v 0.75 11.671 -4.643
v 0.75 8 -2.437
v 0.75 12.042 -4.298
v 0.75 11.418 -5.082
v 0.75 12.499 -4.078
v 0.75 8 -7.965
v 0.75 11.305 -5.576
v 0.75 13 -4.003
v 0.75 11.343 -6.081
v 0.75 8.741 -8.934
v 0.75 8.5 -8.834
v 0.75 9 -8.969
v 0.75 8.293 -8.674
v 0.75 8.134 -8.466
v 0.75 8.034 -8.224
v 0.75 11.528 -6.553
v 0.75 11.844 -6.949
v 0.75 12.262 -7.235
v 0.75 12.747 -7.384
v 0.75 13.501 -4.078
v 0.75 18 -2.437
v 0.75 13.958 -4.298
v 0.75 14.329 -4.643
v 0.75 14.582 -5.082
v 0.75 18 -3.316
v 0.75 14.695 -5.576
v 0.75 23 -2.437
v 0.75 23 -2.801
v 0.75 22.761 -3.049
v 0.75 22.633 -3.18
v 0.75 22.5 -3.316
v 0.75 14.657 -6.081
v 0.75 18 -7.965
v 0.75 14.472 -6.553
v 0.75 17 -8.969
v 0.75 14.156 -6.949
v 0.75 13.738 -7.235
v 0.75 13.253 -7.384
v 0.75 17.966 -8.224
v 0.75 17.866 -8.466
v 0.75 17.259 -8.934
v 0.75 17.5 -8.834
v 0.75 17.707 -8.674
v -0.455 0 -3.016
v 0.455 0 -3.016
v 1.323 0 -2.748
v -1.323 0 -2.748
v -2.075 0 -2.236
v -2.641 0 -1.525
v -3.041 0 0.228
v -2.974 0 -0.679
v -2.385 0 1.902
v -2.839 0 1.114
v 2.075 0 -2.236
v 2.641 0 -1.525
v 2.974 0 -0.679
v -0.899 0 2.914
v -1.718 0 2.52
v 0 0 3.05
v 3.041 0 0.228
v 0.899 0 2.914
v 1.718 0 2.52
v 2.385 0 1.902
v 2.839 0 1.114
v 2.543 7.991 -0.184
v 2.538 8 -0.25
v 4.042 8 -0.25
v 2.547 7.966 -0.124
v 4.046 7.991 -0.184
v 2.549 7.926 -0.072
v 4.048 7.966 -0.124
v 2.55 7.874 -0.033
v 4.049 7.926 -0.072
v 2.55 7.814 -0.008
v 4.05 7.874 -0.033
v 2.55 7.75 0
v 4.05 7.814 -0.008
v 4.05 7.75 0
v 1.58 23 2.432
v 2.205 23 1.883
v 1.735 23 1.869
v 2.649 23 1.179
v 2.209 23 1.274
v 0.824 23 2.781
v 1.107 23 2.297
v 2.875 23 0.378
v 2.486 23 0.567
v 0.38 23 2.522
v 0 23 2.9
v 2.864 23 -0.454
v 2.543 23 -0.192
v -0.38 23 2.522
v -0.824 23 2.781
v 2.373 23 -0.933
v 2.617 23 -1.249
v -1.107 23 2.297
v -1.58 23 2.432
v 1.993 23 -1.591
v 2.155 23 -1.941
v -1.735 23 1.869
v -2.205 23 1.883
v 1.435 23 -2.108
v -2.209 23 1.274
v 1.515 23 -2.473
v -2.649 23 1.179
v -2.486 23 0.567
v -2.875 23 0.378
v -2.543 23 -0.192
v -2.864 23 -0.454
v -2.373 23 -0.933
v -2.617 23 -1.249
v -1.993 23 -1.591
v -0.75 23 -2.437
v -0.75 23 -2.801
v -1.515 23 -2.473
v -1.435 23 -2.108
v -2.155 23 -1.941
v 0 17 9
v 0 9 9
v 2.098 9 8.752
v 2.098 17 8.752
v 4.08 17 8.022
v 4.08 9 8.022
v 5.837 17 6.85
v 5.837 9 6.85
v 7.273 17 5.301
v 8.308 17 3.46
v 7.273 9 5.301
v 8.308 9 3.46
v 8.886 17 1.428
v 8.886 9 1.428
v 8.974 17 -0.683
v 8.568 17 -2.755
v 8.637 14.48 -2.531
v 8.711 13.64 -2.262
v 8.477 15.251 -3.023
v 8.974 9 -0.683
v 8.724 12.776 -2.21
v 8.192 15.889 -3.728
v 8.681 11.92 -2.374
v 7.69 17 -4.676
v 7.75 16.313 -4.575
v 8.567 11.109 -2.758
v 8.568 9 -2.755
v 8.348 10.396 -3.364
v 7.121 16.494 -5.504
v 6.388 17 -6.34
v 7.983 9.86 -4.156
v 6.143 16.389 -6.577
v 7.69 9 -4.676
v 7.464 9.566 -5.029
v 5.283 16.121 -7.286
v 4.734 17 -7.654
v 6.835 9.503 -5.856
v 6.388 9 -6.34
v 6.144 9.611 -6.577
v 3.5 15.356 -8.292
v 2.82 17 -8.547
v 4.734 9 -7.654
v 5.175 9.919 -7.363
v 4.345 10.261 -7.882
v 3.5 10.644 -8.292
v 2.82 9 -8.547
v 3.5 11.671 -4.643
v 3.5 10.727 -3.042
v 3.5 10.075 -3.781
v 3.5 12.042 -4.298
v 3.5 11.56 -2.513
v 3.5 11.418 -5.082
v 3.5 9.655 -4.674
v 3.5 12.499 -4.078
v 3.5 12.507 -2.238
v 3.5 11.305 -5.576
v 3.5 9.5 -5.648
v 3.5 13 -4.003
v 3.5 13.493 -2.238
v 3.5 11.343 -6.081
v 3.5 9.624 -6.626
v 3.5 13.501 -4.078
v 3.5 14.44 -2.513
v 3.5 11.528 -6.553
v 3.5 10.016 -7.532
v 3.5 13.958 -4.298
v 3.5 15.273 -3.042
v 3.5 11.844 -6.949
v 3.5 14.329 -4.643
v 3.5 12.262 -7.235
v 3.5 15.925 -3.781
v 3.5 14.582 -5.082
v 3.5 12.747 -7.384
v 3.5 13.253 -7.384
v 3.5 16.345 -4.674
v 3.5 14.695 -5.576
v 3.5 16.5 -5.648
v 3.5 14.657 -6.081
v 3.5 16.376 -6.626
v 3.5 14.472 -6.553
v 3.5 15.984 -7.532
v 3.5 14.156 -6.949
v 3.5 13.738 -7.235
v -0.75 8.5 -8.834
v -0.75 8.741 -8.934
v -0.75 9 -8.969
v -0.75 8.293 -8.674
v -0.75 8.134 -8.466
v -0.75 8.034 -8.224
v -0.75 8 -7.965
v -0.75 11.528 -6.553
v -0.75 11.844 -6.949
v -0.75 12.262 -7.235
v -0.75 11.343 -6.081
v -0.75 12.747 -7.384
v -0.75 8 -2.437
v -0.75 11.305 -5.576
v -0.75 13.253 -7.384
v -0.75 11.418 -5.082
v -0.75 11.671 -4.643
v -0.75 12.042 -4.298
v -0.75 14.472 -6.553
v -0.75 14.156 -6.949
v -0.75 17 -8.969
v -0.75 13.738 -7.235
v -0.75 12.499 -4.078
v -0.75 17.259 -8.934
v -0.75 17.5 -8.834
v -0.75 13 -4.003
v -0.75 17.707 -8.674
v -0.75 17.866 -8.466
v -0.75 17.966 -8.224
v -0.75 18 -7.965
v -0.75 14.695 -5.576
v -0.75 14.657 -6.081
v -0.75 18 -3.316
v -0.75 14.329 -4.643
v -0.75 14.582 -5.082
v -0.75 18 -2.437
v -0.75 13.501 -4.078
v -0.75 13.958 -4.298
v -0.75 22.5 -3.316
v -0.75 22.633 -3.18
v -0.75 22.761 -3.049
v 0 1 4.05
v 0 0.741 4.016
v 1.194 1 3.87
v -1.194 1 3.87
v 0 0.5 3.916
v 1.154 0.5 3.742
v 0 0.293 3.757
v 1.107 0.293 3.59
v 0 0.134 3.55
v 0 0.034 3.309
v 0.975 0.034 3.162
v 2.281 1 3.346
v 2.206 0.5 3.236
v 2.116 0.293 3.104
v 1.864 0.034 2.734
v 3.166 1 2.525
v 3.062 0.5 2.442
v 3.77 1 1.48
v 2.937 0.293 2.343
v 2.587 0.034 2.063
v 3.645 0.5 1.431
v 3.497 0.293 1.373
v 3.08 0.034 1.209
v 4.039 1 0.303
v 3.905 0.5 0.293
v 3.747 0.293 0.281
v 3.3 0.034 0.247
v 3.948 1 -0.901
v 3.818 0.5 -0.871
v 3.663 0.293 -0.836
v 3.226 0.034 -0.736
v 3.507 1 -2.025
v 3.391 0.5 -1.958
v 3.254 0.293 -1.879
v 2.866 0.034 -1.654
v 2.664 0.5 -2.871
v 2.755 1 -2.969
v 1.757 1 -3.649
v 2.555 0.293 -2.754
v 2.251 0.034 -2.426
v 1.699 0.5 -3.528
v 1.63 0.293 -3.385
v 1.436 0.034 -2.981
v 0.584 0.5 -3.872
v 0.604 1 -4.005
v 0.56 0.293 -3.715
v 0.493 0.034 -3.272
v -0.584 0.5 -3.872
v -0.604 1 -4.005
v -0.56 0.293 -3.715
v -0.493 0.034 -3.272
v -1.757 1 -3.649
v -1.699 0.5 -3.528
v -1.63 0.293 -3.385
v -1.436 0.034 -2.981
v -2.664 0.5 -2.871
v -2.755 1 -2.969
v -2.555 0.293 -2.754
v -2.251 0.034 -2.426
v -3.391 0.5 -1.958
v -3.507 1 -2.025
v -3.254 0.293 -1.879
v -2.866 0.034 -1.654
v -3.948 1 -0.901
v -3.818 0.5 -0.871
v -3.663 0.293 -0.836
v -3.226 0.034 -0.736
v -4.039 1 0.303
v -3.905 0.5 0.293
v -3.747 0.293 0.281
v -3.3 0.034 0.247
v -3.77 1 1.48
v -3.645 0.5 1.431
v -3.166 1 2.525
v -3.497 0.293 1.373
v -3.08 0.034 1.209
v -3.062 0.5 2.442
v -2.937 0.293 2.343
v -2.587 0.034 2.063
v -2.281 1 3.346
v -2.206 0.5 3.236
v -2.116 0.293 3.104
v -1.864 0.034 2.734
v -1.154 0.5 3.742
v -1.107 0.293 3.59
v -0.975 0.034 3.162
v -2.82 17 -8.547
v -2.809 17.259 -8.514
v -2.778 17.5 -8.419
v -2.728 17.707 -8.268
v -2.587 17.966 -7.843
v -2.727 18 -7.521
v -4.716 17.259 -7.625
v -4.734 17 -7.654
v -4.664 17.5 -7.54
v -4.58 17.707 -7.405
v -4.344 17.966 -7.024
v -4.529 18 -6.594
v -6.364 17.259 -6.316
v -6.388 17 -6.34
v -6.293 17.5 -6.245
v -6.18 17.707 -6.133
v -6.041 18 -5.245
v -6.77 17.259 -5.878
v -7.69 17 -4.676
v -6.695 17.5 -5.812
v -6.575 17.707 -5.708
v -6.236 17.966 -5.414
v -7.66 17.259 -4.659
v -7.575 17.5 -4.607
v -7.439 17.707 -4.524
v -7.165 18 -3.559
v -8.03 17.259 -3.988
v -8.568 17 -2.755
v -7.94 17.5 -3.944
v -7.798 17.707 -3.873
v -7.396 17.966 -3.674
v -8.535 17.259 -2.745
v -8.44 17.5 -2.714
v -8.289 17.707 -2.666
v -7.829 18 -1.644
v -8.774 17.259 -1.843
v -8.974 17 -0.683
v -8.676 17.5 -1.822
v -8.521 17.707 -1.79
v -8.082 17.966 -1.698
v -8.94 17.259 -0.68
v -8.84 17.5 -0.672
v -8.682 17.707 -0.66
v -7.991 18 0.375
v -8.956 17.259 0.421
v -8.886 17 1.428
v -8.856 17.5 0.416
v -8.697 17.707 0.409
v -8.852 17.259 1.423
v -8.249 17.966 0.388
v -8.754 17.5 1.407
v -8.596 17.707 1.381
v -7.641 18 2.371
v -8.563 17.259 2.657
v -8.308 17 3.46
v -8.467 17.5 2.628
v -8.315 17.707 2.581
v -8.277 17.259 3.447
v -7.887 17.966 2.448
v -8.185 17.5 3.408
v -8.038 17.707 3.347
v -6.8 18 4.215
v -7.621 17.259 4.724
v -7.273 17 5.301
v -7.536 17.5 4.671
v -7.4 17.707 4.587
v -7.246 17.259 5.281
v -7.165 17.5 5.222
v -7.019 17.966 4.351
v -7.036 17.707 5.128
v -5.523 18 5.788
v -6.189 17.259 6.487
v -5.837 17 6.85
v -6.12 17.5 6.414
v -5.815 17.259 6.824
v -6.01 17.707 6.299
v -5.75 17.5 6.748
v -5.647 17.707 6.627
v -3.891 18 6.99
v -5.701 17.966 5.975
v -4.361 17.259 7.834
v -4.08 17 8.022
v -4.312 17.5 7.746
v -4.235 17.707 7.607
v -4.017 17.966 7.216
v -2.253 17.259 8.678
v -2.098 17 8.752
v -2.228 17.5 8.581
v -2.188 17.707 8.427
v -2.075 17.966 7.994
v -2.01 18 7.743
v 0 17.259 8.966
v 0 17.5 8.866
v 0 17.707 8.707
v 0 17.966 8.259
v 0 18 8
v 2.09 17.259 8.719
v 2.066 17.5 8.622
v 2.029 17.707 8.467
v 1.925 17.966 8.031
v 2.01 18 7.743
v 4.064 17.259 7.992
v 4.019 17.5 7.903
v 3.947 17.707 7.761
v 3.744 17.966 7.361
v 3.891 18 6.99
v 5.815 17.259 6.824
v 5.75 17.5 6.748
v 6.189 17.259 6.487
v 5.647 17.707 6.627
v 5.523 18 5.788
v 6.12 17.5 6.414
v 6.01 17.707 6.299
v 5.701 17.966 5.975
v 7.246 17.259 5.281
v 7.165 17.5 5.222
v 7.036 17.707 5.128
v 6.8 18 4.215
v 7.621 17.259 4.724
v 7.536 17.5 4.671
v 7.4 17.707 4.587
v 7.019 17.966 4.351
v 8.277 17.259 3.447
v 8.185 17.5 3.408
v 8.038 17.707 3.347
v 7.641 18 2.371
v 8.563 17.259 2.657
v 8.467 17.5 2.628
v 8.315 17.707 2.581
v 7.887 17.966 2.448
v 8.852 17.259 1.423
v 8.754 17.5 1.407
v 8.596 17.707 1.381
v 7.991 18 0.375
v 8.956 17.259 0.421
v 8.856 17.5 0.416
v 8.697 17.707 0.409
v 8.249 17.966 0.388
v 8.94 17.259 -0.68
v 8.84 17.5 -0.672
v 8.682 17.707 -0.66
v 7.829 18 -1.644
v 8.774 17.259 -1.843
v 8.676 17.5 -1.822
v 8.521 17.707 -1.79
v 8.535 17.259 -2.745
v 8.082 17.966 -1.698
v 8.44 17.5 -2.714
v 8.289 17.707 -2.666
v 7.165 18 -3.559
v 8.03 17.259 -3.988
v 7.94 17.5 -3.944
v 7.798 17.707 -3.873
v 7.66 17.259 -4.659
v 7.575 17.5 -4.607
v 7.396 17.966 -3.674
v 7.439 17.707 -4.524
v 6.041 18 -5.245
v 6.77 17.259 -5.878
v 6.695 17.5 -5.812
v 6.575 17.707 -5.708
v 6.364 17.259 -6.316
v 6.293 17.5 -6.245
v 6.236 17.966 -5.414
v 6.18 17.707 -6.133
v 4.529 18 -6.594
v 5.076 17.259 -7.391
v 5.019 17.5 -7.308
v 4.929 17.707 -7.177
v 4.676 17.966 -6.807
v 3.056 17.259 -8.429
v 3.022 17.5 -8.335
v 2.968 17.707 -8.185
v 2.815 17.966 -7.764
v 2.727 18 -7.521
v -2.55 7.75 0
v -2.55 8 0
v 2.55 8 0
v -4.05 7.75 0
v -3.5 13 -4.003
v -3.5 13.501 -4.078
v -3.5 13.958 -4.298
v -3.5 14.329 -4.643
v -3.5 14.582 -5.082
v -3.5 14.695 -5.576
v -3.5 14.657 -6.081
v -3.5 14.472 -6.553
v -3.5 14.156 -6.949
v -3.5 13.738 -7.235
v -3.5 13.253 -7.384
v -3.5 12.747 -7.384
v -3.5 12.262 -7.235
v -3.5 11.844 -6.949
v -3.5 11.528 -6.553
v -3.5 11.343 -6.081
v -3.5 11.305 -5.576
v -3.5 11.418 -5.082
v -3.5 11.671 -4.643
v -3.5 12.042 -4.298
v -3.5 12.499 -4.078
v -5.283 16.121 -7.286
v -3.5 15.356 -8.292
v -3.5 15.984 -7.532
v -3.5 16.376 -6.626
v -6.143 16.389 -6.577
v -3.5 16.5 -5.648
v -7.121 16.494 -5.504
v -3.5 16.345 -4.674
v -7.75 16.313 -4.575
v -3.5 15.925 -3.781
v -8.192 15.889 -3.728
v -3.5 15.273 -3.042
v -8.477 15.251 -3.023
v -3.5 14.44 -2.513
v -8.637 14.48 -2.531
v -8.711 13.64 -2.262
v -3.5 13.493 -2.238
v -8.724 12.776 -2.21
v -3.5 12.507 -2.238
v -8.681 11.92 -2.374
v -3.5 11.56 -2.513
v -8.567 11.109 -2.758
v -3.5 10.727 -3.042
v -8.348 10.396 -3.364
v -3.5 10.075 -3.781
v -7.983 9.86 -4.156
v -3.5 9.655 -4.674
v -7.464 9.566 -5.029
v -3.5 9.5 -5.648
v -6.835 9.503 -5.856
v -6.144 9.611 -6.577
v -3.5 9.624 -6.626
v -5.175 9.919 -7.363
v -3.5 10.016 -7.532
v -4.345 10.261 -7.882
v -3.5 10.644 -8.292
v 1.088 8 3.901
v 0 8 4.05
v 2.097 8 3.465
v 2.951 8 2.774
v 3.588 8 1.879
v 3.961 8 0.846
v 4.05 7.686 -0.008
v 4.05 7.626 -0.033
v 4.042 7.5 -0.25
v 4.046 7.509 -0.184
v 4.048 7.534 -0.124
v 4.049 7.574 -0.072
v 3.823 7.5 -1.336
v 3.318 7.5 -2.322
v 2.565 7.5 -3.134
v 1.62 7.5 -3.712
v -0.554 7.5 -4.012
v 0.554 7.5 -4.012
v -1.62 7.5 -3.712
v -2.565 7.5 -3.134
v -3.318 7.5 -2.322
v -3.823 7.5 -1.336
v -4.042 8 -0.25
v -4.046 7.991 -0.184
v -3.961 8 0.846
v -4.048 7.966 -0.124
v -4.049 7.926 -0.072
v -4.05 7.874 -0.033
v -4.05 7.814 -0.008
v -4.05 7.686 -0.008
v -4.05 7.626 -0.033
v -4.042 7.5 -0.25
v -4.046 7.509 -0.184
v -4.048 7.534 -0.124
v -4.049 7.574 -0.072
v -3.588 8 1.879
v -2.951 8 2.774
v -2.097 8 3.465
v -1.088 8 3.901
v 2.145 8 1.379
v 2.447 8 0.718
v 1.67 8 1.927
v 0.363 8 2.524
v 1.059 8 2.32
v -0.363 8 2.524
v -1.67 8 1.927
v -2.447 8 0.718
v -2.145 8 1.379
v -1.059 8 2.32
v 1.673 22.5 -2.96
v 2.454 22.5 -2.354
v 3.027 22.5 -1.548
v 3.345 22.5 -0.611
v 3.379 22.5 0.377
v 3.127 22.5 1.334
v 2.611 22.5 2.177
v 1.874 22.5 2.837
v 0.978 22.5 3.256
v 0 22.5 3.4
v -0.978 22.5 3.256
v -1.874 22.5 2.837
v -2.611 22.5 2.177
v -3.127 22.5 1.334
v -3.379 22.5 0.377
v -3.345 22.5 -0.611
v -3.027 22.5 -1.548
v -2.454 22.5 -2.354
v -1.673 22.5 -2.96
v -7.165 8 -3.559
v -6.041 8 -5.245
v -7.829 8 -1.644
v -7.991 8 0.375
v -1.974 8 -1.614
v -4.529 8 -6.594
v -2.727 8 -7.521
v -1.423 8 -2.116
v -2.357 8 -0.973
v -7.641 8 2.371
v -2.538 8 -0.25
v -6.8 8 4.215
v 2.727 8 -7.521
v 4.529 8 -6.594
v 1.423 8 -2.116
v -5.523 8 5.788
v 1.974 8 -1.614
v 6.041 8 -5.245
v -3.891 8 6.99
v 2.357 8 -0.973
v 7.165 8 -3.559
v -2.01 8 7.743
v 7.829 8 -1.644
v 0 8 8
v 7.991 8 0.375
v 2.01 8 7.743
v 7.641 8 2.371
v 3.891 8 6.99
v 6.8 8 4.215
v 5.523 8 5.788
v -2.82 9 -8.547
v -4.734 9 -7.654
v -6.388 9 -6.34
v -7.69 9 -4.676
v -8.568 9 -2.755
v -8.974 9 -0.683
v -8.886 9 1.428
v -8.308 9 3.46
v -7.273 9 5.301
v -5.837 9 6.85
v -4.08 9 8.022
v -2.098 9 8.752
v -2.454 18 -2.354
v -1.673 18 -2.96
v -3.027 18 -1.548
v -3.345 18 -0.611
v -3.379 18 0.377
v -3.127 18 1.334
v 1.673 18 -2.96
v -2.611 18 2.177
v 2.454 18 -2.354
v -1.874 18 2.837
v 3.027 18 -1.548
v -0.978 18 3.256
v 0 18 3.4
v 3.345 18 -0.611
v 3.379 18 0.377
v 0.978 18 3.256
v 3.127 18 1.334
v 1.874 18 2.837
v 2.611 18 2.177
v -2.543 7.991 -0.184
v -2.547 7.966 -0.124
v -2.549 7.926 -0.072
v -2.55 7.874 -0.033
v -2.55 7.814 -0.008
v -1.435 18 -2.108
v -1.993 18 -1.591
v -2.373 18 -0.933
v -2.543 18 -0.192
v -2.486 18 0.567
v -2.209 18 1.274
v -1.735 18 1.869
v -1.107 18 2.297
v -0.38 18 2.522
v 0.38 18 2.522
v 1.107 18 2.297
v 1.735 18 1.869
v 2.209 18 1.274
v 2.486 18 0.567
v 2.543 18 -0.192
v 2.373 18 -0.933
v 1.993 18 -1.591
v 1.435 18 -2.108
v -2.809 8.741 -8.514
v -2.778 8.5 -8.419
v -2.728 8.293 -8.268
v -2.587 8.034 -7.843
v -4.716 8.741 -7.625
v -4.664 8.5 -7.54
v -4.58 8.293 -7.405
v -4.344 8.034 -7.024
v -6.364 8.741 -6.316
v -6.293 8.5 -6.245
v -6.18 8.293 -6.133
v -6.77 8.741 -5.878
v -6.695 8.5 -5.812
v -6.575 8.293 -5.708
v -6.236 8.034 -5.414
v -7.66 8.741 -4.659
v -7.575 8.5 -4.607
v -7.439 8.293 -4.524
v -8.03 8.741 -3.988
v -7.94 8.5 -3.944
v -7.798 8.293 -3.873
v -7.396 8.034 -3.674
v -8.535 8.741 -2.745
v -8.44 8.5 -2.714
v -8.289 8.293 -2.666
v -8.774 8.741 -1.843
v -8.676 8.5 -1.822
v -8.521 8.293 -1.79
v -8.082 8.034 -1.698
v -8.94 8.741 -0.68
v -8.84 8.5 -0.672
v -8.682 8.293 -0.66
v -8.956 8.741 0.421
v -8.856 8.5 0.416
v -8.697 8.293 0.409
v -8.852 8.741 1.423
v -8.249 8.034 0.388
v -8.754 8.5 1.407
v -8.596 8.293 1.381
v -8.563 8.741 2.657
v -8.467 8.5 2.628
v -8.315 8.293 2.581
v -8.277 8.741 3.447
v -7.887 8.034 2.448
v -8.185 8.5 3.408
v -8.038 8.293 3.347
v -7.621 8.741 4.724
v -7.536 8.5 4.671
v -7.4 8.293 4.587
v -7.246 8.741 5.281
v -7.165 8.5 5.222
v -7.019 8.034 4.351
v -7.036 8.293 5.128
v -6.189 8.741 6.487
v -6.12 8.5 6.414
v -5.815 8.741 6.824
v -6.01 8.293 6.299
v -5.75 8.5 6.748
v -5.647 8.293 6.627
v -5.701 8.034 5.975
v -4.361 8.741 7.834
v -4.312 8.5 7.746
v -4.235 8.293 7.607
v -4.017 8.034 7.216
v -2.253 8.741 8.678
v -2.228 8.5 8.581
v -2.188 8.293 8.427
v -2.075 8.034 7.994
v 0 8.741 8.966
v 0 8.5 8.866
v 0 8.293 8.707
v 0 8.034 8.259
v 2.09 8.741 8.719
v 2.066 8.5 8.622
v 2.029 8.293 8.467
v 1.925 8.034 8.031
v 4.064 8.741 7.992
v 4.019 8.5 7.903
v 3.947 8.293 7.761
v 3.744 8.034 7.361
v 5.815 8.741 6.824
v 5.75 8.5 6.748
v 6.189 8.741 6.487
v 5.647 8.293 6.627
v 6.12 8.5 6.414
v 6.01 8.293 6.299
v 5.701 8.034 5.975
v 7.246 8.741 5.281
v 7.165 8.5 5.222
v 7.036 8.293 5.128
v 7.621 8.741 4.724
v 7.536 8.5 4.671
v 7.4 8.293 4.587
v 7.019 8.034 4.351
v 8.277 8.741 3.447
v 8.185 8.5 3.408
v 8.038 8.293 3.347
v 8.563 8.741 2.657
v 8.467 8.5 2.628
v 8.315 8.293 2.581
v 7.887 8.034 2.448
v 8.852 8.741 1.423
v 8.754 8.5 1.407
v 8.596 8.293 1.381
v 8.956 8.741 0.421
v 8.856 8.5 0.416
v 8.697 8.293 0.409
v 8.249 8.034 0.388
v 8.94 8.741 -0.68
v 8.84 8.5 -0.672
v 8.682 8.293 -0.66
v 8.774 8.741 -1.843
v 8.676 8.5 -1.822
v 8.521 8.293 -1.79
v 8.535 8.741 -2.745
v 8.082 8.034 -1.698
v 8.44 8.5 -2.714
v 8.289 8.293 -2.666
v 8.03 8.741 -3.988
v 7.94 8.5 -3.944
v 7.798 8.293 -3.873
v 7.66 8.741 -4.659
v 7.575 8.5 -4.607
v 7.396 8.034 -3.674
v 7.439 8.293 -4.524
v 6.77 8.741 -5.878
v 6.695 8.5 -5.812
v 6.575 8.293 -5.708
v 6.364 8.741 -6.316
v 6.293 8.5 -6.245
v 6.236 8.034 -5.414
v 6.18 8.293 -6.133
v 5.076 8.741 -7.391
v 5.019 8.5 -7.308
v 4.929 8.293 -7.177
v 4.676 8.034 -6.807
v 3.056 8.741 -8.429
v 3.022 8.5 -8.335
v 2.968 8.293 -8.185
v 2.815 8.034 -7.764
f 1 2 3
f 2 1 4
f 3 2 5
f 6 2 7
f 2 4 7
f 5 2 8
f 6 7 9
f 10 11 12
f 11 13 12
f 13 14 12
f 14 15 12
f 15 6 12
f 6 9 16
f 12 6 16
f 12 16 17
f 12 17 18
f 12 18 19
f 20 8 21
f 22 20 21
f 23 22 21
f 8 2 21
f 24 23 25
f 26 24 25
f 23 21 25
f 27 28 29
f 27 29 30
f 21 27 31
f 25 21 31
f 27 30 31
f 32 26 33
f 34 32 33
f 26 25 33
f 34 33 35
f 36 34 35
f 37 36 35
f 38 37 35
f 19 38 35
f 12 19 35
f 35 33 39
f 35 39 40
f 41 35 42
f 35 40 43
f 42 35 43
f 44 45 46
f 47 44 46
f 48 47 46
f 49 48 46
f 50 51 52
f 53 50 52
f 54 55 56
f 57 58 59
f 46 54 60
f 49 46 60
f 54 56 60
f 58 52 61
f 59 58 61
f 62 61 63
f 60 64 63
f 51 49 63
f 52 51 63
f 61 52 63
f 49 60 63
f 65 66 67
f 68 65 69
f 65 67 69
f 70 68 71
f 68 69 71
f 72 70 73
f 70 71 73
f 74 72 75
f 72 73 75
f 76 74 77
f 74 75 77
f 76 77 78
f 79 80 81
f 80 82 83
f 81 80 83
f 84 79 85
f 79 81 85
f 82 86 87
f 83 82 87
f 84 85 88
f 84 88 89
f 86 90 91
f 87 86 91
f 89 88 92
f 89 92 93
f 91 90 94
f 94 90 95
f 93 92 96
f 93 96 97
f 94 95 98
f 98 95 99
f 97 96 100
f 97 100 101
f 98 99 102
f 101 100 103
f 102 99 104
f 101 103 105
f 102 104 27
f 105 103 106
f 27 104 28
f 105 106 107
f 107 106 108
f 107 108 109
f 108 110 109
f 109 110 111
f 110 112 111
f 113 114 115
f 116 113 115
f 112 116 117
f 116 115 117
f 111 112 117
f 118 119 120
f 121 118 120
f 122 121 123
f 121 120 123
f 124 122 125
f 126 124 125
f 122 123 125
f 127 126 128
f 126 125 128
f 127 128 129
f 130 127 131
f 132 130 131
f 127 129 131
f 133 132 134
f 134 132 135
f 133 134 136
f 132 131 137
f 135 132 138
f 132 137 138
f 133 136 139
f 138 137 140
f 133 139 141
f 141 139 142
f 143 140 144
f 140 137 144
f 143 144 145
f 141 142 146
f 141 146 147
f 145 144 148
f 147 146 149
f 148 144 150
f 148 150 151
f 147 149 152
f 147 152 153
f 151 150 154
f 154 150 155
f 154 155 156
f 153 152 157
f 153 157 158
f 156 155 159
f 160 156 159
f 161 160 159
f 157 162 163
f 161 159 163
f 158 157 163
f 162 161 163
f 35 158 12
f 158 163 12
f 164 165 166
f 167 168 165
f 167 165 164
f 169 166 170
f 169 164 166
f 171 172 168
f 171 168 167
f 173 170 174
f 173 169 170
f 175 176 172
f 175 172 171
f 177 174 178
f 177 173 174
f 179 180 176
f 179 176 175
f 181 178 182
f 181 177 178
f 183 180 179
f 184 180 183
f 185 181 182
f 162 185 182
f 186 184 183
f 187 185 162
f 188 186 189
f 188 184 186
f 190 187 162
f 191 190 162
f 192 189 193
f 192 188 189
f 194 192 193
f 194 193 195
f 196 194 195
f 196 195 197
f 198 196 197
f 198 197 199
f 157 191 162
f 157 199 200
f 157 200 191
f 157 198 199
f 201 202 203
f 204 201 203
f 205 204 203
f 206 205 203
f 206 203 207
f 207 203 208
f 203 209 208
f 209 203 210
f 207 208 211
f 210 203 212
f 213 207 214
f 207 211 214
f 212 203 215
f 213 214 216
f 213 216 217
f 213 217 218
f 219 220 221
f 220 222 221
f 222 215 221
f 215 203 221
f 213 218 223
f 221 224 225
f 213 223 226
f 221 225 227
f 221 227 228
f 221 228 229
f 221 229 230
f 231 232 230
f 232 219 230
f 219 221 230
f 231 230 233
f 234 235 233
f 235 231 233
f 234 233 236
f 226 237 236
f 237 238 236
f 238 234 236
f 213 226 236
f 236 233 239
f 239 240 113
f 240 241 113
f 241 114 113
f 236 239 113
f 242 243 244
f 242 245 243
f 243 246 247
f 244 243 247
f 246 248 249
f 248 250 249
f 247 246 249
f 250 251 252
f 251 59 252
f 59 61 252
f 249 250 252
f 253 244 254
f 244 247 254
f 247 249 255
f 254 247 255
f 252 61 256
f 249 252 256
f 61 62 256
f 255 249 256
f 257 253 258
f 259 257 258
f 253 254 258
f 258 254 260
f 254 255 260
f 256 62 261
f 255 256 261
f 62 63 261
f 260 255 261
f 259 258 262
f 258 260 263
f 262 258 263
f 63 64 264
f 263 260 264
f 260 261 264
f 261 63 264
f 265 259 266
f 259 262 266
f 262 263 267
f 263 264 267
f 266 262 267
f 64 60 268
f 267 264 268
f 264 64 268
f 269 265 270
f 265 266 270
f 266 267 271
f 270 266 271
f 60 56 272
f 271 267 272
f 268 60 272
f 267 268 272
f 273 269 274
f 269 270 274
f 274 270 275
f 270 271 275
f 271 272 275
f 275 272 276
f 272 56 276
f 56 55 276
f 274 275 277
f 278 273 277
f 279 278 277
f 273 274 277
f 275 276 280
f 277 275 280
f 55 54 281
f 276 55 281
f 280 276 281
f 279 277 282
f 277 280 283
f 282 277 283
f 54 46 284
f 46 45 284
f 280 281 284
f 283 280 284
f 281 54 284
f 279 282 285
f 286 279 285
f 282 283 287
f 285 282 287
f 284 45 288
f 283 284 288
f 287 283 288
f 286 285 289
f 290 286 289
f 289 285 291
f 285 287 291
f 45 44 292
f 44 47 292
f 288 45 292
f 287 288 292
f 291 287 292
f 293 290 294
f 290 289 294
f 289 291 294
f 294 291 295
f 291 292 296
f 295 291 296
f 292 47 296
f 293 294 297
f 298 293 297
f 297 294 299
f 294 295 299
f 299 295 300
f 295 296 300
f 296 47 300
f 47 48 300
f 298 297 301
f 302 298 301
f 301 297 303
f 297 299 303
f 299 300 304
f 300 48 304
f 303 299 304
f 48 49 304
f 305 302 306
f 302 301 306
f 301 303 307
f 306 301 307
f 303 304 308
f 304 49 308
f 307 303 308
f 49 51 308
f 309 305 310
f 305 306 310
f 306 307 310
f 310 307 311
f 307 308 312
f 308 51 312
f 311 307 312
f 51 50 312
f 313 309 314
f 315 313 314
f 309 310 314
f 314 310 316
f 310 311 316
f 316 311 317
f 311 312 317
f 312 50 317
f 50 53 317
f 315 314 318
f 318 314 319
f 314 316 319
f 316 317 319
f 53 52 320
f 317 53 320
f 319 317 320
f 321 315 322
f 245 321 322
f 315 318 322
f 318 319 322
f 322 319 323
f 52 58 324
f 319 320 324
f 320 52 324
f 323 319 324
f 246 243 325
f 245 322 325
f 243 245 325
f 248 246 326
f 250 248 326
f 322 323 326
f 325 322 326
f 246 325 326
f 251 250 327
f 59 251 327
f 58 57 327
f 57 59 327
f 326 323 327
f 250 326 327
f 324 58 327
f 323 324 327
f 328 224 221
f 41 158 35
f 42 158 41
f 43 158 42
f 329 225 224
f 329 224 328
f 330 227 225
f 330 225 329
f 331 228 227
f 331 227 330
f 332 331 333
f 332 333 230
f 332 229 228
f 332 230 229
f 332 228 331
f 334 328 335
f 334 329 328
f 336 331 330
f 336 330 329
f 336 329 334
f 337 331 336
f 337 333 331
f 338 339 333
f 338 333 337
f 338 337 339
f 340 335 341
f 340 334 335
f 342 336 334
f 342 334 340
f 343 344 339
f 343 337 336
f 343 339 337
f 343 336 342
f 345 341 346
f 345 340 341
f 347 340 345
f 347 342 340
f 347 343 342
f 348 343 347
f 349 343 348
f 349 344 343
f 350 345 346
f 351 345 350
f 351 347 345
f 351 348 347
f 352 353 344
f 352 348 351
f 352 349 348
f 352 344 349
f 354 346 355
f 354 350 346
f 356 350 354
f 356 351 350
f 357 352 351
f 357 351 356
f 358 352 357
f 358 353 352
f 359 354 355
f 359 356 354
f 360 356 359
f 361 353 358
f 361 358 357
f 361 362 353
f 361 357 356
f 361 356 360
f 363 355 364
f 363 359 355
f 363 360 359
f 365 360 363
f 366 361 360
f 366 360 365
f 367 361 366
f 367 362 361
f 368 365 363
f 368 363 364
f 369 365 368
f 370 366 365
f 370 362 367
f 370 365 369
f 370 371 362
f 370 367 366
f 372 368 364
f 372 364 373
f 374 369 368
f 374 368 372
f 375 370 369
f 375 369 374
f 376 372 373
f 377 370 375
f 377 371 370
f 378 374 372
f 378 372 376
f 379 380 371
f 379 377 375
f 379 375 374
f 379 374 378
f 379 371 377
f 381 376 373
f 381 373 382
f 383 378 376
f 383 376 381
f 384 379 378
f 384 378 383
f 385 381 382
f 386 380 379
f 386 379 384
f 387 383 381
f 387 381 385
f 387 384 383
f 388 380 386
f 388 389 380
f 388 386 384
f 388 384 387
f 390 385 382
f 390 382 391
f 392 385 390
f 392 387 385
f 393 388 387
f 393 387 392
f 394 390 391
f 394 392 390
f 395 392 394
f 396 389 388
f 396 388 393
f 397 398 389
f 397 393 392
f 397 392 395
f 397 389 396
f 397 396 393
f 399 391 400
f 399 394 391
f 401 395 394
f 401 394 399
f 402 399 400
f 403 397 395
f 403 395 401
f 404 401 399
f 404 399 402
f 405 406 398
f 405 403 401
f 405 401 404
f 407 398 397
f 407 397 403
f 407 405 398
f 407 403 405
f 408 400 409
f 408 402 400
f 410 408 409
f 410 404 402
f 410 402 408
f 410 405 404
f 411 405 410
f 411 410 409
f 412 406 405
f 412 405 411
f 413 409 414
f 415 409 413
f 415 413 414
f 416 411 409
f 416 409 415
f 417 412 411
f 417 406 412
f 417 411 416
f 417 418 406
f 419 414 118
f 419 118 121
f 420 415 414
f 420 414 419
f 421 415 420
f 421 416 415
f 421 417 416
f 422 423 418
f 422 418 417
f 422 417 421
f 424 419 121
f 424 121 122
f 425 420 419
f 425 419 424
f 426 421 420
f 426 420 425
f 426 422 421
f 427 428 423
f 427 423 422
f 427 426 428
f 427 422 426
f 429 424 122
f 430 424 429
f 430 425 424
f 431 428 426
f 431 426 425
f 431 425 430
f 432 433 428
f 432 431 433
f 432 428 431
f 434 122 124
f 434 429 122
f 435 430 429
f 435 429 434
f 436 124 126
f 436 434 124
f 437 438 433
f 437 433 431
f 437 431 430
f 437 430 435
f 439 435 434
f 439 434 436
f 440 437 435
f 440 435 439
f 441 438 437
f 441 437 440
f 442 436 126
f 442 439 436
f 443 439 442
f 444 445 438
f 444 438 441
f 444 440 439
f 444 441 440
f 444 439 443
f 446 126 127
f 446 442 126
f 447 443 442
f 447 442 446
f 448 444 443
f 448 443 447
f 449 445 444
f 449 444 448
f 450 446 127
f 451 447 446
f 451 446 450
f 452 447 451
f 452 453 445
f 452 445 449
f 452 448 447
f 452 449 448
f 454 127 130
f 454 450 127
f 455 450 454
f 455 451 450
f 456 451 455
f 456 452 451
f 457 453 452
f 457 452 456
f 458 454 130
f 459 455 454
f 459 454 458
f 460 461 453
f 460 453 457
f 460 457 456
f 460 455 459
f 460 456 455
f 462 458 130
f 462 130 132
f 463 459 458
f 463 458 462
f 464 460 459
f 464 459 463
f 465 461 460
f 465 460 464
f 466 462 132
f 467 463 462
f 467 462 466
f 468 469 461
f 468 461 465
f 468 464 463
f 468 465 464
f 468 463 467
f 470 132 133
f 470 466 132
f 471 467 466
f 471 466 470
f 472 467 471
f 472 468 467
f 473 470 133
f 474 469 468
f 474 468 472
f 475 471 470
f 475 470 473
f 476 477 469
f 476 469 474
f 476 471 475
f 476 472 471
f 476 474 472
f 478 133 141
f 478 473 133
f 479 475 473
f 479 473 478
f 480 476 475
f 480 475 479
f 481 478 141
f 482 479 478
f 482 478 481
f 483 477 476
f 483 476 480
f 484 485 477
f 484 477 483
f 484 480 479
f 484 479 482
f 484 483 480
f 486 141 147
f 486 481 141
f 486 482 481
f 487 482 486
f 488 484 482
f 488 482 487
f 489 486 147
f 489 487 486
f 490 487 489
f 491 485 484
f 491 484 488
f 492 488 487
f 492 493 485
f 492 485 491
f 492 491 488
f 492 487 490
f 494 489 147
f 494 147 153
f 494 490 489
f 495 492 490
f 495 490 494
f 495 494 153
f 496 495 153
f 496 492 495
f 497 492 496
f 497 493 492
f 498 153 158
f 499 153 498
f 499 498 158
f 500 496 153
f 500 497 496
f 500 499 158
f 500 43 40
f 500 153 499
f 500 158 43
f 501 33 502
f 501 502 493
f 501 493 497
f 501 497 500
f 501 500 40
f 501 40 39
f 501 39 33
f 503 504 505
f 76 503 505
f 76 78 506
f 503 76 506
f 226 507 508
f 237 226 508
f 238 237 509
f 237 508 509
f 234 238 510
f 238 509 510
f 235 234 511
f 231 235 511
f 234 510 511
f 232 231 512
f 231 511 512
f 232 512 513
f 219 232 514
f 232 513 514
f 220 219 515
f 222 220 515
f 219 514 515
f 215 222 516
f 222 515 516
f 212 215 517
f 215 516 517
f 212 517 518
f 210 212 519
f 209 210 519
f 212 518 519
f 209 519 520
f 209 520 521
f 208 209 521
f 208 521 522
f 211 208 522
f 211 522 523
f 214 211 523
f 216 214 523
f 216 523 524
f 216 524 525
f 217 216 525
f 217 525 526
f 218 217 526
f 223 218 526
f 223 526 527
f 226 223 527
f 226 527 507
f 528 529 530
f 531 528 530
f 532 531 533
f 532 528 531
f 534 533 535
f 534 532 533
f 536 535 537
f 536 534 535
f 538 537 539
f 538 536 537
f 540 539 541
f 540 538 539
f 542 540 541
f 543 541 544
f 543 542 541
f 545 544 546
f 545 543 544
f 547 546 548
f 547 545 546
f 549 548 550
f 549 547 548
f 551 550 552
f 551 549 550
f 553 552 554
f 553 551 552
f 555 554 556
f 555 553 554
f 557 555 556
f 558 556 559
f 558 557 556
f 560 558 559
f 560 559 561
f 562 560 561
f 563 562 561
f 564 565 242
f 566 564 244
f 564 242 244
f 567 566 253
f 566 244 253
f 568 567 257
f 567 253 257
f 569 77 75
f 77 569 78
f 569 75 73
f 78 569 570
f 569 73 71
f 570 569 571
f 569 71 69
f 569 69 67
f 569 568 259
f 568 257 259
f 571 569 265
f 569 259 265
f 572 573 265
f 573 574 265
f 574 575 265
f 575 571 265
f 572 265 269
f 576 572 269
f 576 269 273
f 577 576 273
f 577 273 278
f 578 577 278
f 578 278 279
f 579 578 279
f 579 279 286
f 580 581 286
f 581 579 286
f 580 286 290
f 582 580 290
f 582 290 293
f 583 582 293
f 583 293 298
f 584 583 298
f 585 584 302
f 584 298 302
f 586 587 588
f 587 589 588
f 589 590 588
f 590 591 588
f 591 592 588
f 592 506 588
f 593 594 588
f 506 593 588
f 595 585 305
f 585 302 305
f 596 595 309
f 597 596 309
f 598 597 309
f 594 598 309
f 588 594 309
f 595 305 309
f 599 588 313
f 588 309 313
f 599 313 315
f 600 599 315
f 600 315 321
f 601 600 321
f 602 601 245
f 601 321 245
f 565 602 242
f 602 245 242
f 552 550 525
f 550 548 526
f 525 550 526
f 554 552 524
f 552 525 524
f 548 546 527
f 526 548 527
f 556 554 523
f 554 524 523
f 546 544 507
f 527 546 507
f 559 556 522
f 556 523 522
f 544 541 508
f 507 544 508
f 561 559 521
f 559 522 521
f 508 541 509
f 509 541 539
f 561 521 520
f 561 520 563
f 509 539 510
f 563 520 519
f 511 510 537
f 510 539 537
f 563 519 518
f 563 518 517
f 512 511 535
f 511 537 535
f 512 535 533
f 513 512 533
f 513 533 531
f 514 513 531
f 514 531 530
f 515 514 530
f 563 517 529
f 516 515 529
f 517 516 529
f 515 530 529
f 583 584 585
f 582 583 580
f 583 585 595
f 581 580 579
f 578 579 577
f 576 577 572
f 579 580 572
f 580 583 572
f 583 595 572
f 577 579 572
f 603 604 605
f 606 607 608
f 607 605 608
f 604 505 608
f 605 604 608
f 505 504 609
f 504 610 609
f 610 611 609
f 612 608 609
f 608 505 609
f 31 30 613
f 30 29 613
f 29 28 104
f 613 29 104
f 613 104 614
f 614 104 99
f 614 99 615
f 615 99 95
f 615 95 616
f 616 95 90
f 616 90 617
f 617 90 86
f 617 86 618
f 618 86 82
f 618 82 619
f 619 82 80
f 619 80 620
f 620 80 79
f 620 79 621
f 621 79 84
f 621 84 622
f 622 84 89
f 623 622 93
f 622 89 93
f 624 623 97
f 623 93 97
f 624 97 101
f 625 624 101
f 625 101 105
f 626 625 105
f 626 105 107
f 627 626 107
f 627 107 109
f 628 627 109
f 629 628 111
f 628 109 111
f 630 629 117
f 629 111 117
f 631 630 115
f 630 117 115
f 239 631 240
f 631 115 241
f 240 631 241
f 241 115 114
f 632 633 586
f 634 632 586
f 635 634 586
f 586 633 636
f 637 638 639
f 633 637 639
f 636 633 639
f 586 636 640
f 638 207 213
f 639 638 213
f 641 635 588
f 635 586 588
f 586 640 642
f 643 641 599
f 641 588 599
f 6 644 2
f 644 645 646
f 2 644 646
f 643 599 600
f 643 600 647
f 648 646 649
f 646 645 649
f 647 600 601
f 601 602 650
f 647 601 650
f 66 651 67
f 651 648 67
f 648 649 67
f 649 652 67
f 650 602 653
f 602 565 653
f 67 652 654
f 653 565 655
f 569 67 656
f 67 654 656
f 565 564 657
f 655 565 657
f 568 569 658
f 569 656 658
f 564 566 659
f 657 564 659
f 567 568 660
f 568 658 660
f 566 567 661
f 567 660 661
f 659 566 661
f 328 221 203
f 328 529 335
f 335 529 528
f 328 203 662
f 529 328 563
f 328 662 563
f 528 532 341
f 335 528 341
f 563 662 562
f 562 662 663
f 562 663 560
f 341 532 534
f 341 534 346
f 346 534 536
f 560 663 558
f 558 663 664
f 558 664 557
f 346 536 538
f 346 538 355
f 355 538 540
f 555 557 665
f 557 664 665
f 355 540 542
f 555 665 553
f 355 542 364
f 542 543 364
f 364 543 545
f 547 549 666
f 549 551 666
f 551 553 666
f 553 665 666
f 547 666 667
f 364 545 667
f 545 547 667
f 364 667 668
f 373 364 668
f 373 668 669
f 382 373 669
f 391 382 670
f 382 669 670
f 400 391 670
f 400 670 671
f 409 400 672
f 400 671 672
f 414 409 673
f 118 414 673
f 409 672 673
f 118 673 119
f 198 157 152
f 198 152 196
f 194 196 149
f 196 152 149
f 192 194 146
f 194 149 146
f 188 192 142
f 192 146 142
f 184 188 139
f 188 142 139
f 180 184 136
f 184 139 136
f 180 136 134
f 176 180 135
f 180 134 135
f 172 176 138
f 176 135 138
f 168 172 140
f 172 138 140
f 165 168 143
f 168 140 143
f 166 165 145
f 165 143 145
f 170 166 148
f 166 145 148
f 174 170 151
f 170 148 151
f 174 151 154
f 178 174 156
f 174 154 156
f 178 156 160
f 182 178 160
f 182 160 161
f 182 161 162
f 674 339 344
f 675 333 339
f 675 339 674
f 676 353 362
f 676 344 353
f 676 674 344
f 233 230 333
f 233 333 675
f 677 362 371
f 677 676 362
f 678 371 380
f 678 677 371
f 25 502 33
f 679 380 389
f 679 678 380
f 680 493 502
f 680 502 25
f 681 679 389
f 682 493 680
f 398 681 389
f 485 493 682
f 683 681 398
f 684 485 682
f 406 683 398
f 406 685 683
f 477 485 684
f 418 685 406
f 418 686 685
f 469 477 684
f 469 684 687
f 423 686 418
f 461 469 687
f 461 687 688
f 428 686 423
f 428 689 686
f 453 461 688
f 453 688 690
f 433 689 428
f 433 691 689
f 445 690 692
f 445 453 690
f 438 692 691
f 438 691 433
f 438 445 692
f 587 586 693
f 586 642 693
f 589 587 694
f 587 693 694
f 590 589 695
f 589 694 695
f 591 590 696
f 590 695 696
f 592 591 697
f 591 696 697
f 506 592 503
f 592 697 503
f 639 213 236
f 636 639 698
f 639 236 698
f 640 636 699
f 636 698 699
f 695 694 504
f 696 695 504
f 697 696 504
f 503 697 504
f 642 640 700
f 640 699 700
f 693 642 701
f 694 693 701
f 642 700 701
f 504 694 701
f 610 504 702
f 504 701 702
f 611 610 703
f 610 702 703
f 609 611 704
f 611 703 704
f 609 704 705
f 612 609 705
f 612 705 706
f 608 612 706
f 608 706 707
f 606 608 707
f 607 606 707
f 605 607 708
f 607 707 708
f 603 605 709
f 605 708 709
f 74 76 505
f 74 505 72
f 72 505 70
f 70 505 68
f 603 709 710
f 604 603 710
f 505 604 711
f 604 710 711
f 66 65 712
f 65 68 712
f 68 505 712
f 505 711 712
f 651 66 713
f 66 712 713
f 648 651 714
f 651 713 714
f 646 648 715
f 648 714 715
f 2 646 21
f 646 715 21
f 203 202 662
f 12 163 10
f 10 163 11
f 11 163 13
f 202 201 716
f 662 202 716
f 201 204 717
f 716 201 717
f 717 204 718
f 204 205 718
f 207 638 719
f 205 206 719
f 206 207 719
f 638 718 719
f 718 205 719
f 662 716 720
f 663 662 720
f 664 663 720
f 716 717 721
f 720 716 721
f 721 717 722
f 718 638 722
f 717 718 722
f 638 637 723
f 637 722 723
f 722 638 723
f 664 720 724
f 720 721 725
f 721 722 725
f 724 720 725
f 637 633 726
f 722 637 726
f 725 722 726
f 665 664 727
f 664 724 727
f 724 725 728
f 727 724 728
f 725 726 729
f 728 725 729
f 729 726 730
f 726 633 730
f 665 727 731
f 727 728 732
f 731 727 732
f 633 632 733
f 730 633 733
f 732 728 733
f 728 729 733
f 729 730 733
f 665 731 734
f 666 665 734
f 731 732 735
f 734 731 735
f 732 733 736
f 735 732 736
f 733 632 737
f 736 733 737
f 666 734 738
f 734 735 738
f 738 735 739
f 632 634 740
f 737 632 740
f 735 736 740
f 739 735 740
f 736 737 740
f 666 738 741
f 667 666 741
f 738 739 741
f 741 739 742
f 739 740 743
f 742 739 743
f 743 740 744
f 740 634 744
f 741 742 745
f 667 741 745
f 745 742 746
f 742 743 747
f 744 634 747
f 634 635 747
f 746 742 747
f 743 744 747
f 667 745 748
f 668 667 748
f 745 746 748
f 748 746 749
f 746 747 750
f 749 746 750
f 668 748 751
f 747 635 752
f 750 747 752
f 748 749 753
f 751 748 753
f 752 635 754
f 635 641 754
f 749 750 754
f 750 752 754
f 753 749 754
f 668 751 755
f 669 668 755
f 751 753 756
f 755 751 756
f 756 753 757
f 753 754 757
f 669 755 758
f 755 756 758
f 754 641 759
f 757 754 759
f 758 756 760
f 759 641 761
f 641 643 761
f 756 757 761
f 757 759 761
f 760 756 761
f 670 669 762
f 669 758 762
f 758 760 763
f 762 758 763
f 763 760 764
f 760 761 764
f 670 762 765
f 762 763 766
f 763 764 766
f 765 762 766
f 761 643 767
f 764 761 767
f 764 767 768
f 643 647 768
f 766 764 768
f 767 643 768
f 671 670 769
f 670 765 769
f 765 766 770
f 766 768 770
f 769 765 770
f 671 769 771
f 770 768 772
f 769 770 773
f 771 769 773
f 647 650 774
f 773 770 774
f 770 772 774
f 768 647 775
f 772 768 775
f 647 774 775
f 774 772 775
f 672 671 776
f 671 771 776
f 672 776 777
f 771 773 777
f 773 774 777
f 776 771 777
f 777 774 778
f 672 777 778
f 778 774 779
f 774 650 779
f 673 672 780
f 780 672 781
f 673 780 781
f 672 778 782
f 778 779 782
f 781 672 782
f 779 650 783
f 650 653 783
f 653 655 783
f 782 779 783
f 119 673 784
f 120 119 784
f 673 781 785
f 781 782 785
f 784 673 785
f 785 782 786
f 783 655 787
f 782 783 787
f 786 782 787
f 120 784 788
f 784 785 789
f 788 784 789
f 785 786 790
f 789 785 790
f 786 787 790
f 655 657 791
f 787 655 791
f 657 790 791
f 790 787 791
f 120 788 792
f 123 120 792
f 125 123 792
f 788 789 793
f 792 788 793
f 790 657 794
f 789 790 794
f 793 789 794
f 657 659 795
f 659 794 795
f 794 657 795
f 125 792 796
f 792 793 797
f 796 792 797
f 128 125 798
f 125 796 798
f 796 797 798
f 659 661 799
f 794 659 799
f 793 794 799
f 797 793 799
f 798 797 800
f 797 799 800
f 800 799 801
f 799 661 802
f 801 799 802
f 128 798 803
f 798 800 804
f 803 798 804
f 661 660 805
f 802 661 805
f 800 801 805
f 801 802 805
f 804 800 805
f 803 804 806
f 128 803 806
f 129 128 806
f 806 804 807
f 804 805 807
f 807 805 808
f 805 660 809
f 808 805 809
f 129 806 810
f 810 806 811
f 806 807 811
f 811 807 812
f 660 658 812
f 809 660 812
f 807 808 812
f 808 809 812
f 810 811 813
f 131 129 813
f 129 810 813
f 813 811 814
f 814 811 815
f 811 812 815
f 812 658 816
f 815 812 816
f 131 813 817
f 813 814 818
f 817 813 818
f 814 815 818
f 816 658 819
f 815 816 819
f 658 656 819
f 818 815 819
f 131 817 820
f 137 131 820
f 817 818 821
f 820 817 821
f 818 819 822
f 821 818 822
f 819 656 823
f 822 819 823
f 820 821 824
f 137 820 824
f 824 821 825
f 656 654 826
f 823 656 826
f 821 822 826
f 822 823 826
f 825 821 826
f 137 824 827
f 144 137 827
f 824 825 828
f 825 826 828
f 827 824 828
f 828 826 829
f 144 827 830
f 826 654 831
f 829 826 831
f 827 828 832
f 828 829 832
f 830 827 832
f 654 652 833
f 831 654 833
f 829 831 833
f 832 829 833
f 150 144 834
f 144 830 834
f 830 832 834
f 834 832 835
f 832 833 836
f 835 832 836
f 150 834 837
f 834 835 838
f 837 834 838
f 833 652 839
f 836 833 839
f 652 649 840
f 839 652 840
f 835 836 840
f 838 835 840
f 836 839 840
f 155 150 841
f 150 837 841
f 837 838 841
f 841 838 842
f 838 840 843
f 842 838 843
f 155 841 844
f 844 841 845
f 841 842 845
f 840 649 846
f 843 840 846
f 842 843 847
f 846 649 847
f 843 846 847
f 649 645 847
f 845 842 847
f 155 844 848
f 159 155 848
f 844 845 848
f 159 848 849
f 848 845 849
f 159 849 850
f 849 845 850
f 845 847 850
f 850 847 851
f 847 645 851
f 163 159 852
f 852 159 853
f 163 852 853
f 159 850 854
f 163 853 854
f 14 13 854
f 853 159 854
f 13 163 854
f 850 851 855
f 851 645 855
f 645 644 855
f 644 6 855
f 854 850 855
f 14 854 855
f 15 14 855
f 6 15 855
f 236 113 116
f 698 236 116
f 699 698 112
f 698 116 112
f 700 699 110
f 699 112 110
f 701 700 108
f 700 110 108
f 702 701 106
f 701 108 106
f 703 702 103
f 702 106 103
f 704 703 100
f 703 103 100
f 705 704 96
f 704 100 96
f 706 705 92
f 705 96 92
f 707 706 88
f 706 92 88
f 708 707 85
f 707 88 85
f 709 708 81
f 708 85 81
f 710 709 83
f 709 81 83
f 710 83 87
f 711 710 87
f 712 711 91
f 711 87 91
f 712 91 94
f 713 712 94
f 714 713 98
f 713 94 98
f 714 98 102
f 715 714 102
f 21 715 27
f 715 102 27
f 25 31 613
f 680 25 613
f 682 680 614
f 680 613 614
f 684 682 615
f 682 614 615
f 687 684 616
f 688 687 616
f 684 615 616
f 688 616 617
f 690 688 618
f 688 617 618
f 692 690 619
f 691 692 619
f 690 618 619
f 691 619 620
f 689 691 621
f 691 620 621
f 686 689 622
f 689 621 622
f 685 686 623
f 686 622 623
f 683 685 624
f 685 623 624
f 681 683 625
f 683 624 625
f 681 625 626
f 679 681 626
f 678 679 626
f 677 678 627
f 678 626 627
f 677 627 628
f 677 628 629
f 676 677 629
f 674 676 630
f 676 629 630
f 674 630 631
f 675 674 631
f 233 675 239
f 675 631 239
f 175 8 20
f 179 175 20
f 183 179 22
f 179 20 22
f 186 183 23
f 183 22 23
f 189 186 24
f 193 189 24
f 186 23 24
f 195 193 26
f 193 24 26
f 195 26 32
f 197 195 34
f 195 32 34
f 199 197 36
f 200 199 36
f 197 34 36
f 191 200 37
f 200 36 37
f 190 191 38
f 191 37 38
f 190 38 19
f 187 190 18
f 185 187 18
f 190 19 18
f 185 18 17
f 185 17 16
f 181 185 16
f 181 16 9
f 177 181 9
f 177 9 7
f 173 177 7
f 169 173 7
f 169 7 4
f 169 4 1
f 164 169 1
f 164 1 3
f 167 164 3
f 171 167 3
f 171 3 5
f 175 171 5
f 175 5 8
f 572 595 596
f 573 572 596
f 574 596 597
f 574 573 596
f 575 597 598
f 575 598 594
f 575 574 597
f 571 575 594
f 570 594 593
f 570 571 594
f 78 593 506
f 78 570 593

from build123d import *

# Parameters (mm, degrees)
SKETCH1_R            = 4.05
BOSS_EXTRUDE1_DEPTH  = 8
SKETCH2_R            = 9
BOSS_EXTRUDE2_DEPTH  = 10
FILLET1_R            = 1
SKETCH3_R            = 2.55
CUT_EXTRUDE1_DEPTH   = 10
CUT_EXTRUDE2_REACH   = 24.045
M3_CLEARANCE_HOLE1_D = 3.4
SKETCH28_R           = 3.5
CUT_EXTRUDE3_DEPTH   = 6.5
SKETCH29_W           = 8.1
SKETCH29_H           = 0.5
CUT_EXTRUDE7_DEPTH   = 23.045407848
FILLET2_R            = 0.25
BOSS_EXTRUDE3_START  = 5
BOSS_EXTRUDE3_DEPTH  = 5
CHAMFER1_SIZE        = 0.5


with BuildPart() as part:
    # Sketch1 → Boss-Extrude1 (new body)
    with BuildSketch(Plane(origin=(0, 0, 0), x_dir=(1, 0, 0), z_dir=(0, 1, 0))):
        with Locations(Location((0, 0, 0), (0, 0, 270))):
            Circle(SKETCH1_R)
    extrude(amount=BOSS_EXTRUDE1_DEPTH)

    # Sketch2 → Boss-Extrude2 (add)
    with BuildSketch(Plane(origin=(0, 8, 0), x_dir=(1, 0, 0), z_dir=(0, 1, 0))):
        with Locations(Location((0, 0, 0), (0, 0, 270))):
            Circle(SKETCH2_R)
    extrude(amount=BOSS_EXTRUDE2_DEPTH)

    # Fillet1
    fillet1_edges = [part.edges().sort_by_distance(p)[0] for p in [
        (0, 0, -4.05),
        (0, 8, -9),
        (0, 18, -9),
    ]]
    fillet(fillet1_edges, radius=FILLET1_R)

    # Sketch3 → Cut-Extrude1 (cut)
    with BuildSketch(Plane(origin=(0, 18, 0), x_dir=(1, 0, 0), z_dir=(0, 1, 0))):
        with Locations(Location((0, 0, 0), (0, 0, 270))):
            Circle(SKETCH3_R)
    extrude(amount=-CUT_EXTRUDE1_DEPTH, mode=Mode.SUBTRACT)

    # Cut-Extrude2: up to this face of the body (flat: up to its plane)
    cut_extrude2_end = Plane(part.part.faces().sort_by_distance((0, 8, -7.77372583))[0])
    # Sketch20 → Cut-Extrude2 (cut, up to the picked face)
    with BuildSketch(Plane(origin=(0, 18, 0), x_dir=(1, 0, 0), z_dir=(0, 1, 0)), mode=Mode.PRIVATE) as cut_extrude2_sk1:
        with BuildLine():
            Line((-0.75, 2.437211521), (0.75, 2.437211521))
            Line((0.75, 2.437211521), (0.75, 8.968695557))
            ThreePointArc((0.75, 8.968695557), (0, 9), (-0.75, 8.968695557))
            Line((-0.75, 8.968695557), (-0.75, 2.437211521))
        make_face()
    cut_extrude2_tool1 = split(extrude(cut_extrude2_sk1.sketch, amount=-CUT_EXTRUDE2_REACH, mode=Mode.PRIVATE), bisect_by=cut_extrude2_end, keep=Keep.BOTH, mode=Mode.PRIVATE)
    add(cut_extrude2_tool1.solids().sort_by(Axis((0, 18, -5.713399), (0, -1, 0)))[0], mode=Mode.SUBTRACT)

    # M3 Clearance Hole1 (through all)
    with Locations(Plane(origin=(10, 0, 0), x_dir=(0, 0, -1), z_dir=(1, 0, 0))):
        with Locations((5.702953539, 13)):
            Hole(M3_CLEARANCE_HOLE1_D / 2)

    # Sketch28 → Cut-Extrude3 (cut)
    with BuildSketch(Plane(origin=(10, 0, 0), x_dir=(0, 0, -1), z_dir=(1, 0, 0))):
        with Locations((5.702953539, 13)):
            Circle(SKETCH28_R)
    cut_extrude3 = extrude(amount=-CUT_EXTRUDE3_DEPTH, mode=Mode.SUBTRACT)

    # Mirror1: Cut-Extrude3 across plane
    add(cut_extrude3.mirror(Plane(origin=(0, 0, 0), x_dir=(0, 0, 1), z_dir=(1, 0, 0))), mode=Mode.SUBTRACT)

    # Sketch29 → Cut-Extrude7 (cut, through all)
    with BuildSketch(Plane.XY):
        with Locations((0, 7.75)):
            Rectangle(SKETCH29_W, SKETCH29_H)
    extrude(amount=-CUT_EXTRUDE7_DEPTH, mode=Mode.SUBTRACT)

    # Fillet2
    fillet2_edges = [part.edges().sort_by_distance(p)[0] for p in [
        (-3.3, 8, 0),
        (3.3, 8, 0),
        (0, 7.5, 0),
    ]]
    fillet(fillet2_edges, radius=FILLET2_R - 0.0001)  # a hair under: the kernel refuses the full size

    # Sketch30 → Boss-Extrude3 (add)
    with BuildSketch(Plane(origin=(0, 18, 0), x_dir=(1, 0, 0), z_dir=(0, 1, 0)).offset(BOSS_EXTRUDE3_START)):
        with BuildLine():
            Line((-0.75, 3.31624788), (-0.75, 2.437211521))
            ThreePointArc((-0.75, 2.437211521), (0, -2.55), (0.75, 2.437211521))
            Line((0.75, 2.437211521), (0.75, 3.31624788))
            ThreePointArc((0.75, 3.31624788), (0, -3.4), (-0.75, 3.31624788))
        make_face()
    extrude(amount=-BOSS_EXTRUDE3_DEPTH)

    # Chamfer1
    chamfer1_edges = [part.edges().sort_by_distance(p)[0] for p in [
        (0, 23, 3.4),
    ]]
    chamfer(chamfer1_edges, length=CHAMFER1_SIZE)


solid = part.part
